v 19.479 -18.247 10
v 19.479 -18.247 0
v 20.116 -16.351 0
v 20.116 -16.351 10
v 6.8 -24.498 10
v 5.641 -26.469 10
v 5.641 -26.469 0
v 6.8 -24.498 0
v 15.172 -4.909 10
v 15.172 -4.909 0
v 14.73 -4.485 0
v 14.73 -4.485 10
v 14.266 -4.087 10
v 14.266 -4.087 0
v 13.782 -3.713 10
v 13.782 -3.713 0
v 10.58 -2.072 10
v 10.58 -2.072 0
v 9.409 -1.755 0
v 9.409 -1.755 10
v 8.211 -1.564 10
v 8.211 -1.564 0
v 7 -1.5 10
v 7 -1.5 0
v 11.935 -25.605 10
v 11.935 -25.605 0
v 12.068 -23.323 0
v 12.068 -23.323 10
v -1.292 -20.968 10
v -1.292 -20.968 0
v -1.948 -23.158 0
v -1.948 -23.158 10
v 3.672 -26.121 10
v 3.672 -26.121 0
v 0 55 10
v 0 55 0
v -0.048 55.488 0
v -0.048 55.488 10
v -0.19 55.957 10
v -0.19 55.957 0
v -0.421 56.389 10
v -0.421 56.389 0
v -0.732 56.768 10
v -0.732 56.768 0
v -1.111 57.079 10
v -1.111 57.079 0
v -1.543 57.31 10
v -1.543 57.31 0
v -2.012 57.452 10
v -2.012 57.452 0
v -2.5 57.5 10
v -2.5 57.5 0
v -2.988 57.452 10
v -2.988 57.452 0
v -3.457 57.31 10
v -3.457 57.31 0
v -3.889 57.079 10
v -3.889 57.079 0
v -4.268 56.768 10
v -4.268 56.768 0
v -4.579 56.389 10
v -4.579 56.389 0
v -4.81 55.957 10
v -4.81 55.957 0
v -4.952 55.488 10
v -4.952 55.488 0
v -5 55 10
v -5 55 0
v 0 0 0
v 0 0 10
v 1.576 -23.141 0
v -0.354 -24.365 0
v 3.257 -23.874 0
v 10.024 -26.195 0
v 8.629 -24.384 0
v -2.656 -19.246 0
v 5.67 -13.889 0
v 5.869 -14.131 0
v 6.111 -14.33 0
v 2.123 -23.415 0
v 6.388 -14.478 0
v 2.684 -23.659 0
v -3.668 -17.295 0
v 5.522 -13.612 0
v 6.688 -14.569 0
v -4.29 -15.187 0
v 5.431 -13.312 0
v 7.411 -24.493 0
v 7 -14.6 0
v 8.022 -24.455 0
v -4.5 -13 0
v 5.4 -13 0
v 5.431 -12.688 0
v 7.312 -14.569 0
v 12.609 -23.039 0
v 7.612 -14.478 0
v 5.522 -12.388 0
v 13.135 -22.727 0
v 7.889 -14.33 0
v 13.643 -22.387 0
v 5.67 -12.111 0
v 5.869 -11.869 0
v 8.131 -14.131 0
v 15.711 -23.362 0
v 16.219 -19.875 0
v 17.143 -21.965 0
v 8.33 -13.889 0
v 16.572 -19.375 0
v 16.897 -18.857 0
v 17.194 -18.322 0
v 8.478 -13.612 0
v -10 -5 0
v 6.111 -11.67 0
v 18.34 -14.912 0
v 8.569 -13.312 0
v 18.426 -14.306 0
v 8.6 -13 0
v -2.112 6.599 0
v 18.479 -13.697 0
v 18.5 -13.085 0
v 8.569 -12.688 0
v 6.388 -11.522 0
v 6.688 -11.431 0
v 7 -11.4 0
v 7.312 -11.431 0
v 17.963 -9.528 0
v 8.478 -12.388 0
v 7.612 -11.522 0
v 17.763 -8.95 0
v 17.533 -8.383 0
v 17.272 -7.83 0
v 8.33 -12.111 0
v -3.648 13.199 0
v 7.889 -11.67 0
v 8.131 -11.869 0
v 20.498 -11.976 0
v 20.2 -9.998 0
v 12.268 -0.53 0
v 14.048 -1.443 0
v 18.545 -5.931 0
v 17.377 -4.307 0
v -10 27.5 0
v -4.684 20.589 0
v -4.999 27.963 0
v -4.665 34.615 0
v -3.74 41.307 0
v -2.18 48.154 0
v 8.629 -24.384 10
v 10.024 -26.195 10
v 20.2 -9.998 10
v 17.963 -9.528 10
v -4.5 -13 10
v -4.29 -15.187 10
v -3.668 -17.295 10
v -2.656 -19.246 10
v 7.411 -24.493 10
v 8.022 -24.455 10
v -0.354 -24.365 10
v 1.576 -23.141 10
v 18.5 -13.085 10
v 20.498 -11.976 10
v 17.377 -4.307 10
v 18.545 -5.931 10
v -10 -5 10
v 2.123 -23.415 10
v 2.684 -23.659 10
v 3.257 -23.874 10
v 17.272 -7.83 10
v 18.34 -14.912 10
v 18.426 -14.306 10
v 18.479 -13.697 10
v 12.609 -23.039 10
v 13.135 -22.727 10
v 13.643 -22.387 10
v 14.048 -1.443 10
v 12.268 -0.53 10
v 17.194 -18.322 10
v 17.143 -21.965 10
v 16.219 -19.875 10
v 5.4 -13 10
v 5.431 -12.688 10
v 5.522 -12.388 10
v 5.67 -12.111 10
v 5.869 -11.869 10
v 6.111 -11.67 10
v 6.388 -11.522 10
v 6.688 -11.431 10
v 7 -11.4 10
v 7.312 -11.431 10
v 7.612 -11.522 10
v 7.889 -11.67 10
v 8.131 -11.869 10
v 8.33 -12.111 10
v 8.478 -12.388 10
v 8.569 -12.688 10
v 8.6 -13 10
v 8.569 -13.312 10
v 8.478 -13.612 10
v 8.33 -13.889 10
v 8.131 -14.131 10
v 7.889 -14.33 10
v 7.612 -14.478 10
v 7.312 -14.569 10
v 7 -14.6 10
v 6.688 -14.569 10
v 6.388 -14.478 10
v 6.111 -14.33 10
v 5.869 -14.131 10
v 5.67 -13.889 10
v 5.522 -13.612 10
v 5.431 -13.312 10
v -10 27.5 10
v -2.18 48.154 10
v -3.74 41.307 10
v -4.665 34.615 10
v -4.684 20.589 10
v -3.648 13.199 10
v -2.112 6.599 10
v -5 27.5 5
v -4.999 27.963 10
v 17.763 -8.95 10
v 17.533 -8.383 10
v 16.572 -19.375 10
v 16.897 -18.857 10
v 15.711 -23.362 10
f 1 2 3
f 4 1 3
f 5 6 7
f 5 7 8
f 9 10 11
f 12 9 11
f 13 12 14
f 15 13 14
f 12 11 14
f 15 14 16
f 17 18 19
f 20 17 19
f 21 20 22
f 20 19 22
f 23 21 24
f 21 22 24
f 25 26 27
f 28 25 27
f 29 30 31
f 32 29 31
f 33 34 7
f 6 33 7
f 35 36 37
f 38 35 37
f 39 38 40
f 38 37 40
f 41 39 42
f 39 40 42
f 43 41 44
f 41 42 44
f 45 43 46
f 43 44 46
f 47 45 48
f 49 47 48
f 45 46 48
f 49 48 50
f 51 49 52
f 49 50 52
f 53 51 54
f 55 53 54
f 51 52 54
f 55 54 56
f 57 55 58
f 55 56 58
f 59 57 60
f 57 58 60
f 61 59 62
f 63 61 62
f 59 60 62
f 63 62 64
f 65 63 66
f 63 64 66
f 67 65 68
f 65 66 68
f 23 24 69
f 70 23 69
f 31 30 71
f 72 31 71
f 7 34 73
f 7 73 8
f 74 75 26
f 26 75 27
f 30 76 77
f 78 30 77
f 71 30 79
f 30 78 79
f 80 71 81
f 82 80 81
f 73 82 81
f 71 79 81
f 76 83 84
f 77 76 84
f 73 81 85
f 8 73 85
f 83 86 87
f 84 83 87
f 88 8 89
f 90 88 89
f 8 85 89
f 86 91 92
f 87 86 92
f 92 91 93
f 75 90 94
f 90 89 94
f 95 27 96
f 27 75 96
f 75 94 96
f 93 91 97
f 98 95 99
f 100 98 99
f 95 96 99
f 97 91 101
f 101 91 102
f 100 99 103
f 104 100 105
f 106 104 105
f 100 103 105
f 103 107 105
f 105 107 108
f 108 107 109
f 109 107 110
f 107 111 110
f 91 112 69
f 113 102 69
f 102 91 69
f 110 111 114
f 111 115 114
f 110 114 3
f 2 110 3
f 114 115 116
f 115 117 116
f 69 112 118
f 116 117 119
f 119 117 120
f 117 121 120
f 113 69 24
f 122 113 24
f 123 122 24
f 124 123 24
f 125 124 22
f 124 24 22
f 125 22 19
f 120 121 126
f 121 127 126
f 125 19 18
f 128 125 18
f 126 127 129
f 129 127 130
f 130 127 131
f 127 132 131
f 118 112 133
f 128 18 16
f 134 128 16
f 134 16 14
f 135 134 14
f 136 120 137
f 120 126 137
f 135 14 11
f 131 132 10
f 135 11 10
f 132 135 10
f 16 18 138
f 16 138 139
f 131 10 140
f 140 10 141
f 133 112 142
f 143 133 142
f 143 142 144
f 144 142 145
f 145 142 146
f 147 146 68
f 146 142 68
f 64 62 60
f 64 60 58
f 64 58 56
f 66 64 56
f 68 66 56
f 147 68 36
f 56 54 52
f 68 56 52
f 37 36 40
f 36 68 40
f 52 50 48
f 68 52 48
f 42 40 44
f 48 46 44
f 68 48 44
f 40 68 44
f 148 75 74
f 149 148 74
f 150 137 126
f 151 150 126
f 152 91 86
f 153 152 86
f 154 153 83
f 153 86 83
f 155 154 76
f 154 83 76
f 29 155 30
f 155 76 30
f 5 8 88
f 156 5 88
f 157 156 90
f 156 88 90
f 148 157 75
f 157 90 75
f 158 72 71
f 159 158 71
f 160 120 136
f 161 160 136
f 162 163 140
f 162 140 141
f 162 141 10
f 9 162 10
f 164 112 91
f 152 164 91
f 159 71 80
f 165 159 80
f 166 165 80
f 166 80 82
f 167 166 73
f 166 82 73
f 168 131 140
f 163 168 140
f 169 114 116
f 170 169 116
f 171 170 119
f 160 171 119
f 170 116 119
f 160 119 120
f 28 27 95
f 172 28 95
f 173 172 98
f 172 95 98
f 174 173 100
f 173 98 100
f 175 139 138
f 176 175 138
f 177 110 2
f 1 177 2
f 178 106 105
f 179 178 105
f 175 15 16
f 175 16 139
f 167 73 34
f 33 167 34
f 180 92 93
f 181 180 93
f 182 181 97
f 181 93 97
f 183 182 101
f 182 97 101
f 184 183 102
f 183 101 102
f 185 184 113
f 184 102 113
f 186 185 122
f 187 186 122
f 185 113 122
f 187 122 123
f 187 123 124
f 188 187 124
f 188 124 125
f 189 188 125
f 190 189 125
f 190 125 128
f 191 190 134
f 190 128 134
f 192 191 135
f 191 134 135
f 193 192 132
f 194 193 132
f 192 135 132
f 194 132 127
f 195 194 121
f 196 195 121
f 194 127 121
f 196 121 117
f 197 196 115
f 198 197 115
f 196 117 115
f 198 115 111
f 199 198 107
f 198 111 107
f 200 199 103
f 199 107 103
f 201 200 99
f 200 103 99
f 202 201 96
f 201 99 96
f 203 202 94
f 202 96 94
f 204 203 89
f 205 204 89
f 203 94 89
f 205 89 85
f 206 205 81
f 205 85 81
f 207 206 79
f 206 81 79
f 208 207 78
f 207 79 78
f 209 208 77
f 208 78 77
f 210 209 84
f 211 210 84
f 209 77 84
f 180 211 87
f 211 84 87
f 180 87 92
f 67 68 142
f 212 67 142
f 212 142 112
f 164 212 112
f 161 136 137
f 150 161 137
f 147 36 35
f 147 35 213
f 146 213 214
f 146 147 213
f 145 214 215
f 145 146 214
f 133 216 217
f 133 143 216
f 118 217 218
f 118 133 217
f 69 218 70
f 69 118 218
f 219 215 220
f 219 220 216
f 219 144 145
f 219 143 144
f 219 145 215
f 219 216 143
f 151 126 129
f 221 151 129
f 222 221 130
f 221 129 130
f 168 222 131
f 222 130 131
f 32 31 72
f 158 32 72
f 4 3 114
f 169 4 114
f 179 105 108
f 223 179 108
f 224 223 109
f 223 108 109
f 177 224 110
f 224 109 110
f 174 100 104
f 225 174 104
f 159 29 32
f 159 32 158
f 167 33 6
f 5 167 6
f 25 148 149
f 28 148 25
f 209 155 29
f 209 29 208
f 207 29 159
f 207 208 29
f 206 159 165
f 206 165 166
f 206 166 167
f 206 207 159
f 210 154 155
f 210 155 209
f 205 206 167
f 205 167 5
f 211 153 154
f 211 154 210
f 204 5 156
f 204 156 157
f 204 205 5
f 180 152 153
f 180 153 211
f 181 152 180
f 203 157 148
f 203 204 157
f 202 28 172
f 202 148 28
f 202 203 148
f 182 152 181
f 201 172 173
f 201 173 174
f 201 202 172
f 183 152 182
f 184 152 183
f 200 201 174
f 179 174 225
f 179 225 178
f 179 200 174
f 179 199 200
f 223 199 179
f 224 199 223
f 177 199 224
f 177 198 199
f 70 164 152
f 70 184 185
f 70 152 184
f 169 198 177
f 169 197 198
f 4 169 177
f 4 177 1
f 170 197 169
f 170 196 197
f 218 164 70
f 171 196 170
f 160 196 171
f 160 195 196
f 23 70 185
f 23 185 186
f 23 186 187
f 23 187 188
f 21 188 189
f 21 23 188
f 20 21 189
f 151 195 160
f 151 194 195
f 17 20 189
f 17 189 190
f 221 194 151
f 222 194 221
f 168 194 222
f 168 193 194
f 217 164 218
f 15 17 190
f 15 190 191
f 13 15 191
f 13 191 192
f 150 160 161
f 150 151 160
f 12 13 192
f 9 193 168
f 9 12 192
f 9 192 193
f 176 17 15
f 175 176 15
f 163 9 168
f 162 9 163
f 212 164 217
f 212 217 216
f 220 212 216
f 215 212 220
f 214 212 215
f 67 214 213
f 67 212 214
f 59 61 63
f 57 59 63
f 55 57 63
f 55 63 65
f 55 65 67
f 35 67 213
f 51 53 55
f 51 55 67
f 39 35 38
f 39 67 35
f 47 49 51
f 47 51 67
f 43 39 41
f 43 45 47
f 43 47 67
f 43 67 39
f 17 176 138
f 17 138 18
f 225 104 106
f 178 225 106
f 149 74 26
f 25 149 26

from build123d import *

# Parameters (mm, degrees)
EXTRUDE_2_DEPTH     = 10
SKETCH_2_R          = 1.6
CUT_EXTRUDE_1_DEPTH = 10


with BuildPart() as part:
    # 草圖1 → 填料-伸長2 (new body)
    with BuildSketch(Plane.XY):
        with BuildLine():
            ThreePointArc((0, 55), (-2.5, 57.5), (-5, 55))
            Line((-5, 55), (-10, 27.5))
            Line((-10, 27.5), (-10, -5))
            Line((-10, -5), (-4.5, -13))
            ThreePointArc((-4.5, -13), (-3.667869554, -17.294945772), (-1.291902751, -20.968334127))
            Line((-1.291902751, -20.968334127), (-1.947985517, -23.157930655))
            Line((-1.947985517, -23.157930655), (-0.353660285, -24.365459974))
            Line((-0.353660285, -24.365459974), (1.576282518, -23.140674962))
            ThreePointArc((1.576282518, -23.140674962), (2.401767343, -23.540695254), (3.256508451, -23.873650308))
            Line((3.256508451, -23.873650308), (3.671596164, -26.12142248))
            Line((3.671596164, -26.12142248), (5.641228986, -26.468620617))
            Line((5.641228986, -26.468620617), (6.799870704, -24.498258488))
            ThreePointArc((6.799870704, -24.498258488), (7.716939899, -24.477630295), (8.629447558, -24.383975608))
            Line((8.629447558, -24.383975608), (10.024280034, -26.194837259))
            Line((10.024280034, -26.194837259), (11.935396246, -25.605231608))
            Line((11.935396246, -25.605231608), (12.067538645, -23.323277197))
            ThreePointArc((12.067538645, -23.323277197), (12.874201866, -22.886544009), (13.643490442, -22.386907624))
            Line((13.643490442, -22.386907624), (15.710846923, -23.362004916))
            Line((15.710846923, -23.362004916), (17.142510983, -21.965459886))
            Line((17.142510983, -21.965459886), (16.219048856, -19.874528216))
            ThreePointArc((16.219048856, -19.874528216), (16.737633381, -19.117883305), (17.194262154, -18.322313325))
            Line((17.194262154, -18.322313325), (19.478794182, -18.246874857))
            Line((19.478794182, -18.246874857), (20.115672942, -16.350988403))
            Line((20.115672942, -16.350988403), (18.340004717, -14.911620519))
            ThreePointArc((18.340004717, -14.911620519), (18.456288995, -14.001719757), (18.499682563, -13.085445547))
            Line((18.499682563, -13.085445547), (20.498207378, -11.976087123))
            Line((20.498207378, -11.976087123), (20.200024227, -9.998440337))
            Line((20.200024227, -9.998440337), (17.963252163, -9.527666203))
            ThreePointArc((17.963252163, -9.527666203), (17.651623839, -8.664921039), (17.272224493, -7.829757842))
            Line((17.272224493, -7.829757842), (18.544554248, -5.930822735))
            Line((18.544554248, -5.930822735), (17.376985928, -4.307004944))
            Line((17.376985928, -4.307004944), (15.171773349, -4.908515567))
            ThreePointArc((15.171773349, -4.908515567), (14.50087055, -4.28295113), (13.782243416, -3.712848971))
            Line((13.782243416, -3.712848971), (14.048139364, -1.442589758))
            Line((14.048139364, -1.442589758), (12.268350249, -0.530257194))
            Line((12.268350249, -0.530257194), (10.580409299, -2.07156602))
            ThreePointArc((10.580409299, -2.07156602), (8.812871925, -1.643790448), (7, -1.5))
            Line((7, -1.5), (0, 0))
            add(Edge.make_bspline(
                [(0, 55), (-10, 27.5), (0, 0)],
                knots=[0, 0, 0, 1, 1, 1], degree=2))
        make_face()
    extrude(amount=EXTRUDE_2_DEPTH)

    # 草圖2 → 除料-伸長1 (cut)
    with BuildSketch(Plane(origin=(0, 0, 0), x_dir=(-1, 0, 0), z_dir=(0, 0, -1))):
        with Locations((-7, -13)):
            Circle(SKETCH_2_R)
    extrude(amount=-CUT_EXTRUDE_1_DEPTH, mode=Mode.SUBTRACT)


solid = part.part
